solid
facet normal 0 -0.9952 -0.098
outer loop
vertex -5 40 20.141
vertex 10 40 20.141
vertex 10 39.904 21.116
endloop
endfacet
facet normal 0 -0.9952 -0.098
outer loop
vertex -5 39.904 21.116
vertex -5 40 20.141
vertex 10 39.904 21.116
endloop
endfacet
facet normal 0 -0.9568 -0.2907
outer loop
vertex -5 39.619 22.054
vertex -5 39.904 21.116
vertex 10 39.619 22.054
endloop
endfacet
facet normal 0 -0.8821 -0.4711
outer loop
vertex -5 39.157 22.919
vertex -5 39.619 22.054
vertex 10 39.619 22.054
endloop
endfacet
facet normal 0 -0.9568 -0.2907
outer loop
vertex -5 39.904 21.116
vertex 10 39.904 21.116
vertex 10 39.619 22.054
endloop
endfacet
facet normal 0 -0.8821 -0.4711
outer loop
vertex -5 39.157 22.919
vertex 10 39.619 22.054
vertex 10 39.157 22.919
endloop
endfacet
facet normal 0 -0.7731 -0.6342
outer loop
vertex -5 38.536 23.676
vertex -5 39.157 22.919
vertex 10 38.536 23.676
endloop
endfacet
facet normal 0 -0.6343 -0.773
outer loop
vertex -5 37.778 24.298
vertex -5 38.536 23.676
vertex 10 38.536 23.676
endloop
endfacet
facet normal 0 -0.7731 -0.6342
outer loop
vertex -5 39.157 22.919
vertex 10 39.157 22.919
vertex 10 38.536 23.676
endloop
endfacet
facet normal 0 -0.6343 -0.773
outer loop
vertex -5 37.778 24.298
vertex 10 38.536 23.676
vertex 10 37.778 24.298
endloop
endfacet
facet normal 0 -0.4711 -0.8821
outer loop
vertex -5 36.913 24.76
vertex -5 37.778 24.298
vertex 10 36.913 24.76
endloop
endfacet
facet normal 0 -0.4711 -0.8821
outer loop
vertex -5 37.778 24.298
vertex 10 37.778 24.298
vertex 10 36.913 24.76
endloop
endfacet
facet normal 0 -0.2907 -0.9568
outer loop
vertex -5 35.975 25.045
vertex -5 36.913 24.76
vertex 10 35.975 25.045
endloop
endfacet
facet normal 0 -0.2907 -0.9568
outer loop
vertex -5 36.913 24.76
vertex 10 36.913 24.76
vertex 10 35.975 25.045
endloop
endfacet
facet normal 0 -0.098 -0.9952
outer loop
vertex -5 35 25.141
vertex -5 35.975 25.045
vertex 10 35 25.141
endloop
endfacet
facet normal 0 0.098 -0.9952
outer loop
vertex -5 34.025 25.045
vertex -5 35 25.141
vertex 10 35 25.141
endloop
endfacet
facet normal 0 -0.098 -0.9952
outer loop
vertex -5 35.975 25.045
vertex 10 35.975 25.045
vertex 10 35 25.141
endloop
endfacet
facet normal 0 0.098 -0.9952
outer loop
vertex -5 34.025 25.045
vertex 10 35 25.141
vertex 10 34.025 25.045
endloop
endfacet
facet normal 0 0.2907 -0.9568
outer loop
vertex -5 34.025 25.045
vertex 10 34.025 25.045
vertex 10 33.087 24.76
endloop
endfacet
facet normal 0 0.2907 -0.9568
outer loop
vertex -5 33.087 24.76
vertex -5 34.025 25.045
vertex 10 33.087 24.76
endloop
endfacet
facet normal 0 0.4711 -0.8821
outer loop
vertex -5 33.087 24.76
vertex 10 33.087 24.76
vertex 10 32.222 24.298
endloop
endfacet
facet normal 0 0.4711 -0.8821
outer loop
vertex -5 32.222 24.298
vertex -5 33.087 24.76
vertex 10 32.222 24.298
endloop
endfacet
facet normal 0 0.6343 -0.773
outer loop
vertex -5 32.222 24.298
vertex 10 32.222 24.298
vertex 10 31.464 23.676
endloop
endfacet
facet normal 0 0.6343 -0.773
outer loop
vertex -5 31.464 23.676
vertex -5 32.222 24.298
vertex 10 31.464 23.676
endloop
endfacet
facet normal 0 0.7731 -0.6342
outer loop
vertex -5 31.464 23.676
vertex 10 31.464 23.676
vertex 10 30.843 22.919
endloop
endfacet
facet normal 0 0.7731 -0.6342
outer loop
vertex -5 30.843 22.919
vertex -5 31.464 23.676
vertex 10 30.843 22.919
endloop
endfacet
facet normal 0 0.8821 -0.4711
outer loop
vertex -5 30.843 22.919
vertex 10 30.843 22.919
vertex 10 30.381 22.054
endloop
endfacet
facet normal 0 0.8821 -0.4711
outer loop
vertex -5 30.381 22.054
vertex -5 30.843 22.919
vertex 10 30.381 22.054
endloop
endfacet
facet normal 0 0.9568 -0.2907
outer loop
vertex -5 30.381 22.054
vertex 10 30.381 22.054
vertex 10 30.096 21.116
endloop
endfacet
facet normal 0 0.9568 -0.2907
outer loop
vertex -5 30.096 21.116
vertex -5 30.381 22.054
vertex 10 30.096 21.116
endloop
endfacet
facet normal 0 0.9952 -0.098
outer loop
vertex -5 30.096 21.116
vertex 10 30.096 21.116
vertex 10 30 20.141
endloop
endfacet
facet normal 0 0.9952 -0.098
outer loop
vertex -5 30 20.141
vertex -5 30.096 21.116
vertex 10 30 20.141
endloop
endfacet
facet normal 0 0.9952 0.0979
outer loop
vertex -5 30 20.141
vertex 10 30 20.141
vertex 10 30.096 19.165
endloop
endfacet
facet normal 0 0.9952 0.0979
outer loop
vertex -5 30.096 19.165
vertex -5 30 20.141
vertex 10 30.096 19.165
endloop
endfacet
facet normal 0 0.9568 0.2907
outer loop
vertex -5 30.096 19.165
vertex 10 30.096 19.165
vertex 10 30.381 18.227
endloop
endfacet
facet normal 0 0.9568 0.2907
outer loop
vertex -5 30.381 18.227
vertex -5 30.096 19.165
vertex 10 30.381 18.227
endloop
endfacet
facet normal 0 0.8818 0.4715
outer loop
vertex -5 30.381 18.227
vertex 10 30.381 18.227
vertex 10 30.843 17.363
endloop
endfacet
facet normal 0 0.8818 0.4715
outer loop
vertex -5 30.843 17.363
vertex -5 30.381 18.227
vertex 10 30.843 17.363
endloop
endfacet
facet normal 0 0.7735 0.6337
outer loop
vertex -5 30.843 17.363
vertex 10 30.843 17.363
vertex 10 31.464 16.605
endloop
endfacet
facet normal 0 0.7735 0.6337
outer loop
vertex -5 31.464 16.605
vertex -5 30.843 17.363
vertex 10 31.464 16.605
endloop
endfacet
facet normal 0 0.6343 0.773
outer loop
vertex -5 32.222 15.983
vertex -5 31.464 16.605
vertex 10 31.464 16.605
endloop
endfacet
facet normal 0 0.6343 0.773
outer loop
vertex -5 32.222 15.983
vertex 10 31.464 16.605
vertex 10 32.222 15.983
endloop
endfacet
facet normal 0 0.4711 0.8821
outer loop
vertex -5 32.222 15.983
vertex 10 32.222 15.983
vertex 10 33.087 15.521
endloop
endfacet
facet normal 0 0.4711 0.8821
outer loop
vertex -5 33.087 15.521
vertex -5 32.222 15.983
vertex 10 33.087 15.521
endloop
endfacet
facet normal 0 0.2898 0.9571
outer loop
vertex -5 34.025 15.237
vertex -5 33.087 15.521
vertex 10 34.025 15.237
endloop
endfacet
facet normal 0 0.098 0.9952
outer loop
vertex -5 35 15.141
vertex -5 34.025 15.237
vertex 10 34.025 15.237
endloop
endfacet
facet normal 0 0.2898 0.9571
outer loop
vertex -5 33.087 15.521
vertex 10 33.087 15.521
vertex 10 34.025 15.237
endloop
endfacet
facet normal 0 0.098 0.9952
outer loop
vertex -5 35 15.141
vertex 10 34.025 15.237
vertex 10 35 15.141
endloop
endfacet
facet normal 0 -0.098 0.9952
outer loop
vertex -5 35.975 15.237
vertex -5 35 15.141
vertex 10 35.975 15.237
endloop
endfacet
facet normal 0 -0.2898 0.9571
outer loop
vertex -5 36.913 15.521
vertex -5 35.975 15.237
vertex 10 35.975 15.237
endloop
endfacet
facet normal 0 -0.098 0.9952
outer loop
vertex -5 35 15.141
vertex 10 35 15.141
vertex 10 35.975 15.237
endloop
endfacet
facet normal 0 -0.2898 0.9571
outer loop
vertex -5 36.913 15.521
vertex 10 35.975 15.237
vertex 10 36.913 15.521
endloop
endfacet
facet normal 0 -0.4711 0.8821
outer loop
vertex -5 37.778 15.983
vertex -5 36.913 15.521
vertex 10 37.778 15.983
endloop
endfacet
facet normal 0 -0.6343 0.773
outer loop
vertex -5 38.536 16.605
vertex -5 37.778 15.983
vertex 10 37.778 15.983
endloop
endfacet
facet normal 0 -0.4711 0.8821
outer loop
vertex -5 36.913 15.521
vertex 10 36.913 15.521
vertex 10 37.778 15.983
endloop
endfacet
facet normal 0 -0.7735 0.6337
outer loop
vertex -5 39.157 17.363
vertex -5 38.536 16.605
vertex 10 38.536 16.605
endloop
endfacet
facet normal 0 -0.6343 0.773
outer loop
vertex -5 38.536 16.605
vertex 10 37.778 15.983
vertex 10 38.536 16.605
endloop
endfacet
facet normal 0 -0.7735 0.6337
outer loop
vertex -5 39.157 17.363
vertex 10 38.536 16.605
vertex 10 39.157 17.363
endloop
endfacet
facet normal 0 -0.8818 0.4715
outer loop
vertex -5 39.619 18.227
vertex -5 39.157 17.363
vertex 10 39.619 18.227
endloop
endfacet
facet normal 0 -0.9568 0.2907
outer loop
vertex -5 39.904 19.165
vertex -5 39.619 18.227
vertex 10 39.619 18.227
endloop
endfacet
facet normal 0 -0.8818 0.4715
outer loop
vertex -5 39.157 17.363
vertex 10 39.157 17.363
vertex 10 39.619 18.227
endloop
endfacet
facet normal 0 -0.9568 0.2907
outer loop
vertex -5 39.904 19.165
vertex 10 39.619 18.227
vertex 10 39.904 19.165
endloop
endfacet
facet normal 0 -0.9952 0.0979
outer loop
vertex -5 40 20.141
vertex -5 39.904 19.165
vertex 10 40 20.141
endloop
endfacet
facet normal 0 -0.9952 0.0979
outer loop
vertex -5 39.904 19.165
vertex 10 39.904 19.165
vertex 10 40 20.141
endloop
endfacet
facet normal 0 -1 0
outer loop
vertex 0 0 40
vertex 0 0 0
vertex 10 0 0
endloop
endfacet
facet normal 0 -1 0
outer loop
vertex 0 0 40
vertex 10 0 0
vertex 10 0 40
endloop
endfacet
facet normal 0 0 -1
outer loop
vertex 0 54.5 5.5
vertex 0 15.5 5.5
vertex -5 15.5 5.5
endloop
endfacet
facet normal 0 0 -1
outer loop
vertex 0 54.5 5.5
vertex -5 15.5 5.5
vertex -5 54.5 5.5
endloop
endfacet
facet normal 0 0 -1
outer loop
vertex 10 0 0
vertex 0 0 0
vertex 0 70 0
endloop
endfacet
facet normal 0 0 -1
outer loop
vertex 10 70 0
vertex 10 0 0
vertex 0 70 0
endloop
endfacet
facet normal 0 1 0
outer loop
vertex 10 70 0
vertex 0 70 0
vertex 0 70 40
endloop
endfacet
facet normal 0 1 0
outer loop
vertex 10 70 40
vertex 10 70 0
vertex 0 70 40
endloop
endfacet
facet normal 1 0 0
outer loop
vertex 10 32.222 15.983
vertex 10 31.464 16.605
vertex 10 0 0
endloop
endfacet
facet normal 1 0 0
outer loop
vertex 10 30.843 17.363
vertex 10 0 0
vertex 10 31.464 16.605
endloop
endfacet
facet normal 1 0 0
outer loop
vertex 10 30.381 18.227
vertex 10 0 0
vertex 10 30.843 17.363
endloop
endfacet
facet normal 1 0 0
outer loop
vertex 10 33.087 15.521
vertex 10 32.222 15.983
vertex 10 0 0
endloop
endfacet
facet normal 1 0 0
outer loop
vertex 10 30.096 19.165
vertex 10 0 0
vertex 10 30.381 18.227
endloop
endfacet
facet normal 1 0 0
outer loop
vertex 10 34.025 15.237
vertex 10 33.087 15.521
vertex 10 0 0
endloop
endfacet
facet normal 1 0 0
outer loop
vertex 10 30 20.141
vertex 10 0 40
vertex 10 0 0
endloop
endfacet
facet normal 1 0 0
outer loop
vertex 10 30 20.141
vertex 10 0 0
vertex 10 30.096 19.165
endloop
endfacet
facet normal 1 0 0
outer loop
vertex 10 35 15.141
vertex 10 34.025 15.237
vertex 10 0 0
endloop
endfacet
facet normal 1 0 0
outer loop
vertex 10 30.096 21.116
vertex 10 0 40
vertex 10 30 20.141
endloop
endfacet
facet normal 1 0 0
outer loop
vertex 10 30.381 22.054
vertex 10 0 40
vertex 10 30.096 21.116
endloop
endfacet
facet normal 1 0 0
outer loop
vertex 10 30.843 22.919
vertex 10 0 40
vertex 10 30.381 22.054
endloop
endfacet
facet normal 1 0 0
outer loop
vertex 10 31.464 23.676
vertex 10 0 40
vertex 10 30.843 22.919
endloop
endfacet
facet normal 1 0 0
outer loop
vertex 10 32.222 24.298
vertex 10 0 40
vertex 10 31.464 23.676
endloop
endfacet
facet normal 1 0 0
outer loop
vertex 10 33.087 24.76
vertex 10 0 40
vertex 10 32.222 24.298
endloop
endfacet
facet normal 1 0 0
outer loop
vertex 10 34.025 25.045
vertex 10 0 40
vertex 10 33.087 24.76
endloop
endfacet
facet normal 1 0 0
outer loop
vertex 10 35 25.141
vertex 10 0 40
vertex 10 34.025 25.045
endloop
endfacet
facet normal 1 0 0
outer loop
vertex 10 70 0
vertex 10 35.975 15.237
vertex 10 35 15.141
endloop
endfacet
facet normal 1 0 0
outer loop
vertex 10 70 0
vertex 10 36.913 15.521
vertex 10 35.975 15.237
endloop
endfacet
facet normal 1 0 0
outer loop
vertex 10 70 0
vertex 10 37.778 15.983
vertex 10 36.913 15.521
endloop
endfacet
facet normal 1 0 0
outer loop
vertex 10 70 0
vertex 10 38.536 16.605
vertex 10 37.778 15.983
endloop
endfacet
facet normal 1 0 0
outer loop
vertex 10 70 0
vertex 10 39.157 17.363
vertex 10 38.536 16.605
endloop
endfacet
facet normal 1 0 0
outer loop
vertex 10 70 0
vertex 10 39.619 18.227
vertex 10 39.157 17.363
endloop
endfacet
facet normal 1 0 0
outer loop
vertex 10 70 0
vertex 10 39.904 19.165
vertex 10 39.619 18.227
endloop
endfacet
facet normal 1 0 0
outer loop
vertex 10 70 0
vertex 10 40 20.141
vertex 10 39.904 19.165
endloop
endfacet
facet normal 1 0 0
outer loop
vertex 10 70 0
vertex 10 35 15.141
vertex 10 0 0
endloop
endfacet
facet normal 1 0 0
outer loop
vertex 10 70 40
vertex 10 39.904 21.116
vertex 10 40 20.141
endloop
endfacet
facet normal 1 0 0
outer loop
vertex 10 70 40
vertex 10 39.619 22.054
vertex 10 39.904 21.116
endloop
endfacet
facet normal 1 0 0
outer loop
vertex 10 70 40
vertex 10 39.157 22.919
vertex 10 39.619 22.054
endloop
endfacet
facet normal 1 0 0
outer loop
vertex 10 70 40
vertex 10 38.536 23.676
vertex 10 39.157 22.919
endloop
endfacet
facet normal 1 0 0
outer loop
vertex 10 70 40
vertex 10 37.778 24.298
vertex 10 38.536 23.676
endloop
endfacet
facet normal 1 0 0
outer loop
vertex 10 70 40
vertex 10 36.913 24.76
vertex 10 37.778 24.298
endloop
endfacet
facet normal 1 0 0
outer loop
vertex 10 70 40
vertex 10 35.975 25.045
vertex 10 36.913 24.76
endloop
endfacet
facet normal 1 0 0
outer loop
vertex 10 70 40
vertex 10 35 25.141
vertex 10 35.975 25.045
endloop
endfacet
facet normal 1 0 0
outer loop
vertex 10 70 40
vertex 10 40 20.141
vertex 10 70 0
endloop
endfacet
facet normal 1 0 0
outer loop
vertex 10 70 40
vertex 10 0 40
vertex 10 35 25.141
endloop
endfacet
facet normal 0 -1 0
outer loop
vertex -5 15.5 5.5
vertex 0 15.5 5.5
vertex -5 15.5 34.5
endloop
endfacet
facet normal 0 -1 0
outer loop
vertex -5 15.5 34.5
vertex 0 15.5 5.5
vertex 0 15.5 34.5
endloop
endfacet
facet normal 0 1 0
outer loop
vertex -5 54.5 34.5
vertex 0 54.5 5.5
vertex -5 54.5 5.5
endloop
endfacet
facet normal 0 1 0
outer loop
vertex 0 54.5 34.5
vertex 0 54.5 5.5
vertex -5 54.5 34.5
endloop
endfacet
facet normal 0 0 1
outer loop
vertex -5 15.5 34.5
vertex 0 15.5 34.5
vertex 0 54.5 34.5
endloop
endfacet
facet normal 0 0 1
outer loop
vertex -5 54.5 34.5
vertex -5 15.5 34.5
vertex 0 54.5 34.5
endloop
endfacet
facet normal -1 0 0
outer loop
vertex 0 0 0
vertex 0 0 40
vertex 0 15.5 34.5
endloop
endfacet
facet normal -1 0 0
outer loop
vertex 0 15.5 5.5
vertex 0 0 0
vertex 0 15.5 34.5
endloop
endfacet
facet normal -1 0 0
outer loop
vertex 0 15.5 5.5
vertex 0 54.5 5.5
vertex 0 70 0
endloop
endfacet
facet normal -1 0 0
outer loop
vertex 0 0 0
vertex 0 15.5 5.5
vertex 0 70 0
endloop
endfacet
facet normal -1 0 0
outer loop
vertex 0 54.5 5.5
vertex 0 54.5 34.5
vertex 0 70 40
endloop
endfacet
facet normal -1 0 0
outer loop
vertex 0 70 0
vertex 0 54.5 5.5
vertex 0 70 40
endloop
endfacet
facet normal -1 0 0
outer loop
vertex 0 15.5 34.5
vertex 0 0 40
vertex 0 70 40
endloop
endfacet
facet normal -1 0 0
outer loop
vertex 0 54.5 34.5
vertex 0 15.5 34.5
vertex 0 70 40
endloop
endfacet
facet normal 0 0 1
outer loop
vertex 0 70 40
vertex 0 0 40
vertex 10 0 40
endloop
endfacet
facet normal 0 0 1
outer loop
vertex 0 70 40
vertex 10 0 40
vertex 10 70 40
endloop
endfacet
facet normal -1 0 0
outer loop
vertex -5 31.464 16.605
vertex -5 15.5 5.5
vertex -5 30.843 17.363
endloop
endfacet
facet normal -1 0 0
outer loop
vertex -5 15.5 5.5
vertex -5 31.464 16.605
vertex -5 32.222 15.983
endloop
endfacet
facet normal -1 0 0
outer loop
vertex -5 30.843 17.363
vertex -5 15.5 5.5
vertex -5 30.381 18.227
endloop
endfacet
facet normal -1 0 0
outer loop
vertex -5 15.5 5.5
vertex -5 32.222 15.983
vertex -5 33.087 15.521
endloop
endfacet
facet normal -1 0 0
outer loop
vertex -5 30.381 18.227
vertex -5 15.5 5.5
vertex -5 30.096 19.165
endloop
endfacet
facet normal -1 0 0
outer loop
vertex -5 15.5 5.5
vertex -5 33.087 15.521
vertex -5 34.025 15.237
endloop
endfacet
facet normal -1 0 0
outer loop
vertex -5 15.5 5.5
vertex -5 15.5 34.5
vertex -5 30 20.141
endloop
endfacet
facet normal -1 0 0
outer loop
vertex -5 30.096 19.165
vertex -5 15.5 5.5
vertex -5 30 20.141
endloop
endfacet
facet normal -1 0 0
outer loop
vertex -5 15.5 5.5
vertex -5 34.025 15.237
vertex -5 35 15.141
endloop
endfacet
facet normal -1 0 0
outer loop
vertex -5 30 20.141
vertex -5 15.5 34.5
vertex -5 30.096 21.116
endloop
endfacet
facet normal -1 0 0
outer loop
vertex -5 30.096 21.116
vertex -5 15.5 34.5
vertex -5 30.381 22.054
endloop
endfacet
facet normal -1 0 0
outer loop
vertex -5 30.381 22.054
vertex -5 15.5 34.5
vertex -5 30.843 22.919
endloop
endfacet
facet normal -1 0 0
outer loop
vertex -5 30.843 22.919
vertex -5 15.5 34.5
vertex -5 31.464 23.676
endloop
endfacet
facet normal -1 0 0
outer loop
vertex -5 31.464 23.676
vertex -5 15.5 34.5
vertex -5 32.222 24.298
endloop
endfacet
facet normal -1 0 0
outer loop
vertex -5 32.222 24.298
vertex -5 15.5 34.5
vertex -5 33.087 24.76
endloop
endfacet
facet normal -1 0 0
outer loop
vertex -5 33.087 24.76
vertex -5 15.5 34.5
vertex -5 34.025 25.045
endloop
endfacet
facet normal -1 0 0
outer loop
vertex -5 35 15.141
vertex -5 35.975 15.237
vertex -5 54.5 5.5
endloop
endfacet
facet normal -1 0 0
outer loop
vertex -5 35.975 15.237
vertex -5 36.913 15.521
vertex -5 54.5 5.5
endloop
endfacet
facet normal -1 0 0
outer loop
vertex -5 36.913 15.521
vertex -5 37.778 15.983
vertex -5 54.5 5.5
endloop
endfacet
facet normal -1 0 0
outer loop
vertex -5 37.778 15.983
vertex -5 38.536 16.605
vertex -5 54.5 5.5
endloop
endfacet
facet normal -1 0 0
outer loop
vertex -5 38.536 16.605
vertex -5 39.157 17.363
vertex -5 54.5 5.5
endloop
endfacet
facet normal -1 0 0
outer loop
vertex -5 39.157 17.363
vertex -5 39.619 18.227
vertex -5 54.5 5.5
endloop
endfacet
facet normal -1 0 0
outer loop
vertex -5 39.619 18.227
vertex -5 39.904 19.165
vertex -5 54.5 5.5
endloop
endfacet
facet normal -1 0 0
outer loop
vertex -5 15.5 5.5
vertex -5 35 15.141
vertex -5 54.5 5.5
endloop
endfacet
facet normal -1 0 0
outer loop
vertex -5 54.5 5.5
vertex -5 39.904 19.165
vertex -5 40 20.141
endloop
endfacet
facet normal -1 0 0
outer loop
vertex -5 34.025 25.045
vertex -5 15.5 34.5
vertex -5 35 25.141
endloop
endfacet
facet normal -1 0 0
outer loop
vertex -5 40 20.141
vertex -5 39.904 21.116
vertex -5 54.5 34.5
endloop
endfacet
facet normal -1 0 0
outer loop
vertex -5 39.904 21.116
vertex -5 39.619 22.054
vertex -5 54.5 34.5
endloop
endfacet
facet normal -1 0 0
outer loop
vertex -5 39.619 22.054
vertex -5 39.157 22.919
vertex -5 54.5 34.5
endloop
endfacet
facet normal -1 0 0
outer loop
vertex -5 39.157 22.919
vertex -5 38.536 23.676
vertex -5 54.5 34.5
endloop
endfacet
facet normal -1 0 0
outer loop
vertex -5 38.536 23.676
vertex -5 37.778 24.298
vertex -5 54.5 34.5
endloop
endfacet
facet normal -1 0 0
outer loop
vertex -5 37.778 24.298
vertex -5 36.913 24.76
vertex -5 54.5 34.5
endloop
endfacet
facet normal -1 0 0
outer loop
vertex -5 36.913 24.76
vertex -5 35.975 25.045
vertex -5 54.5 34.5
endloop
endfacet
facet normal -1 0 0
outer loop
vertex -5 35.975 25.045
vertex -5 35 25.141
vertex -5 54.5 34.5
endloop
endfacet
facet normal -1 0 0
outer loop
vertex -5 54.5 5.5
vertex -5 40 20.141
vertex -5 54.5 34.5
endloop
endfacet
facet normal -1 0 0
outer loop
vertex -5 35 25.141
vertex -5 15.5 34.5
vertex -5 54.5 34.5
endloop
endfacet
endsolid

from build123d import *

# Parameters (mm, degrees)
F0_W     = 70
F0_H     = 40
F1_DEPTH = 10
F2_W     = 39
F2_H     = 29
F3_DEPTH = 15
F4_R     = 5
F5_DEPTH = 25


with BuildPart() as f1:
    # F0 (on Right) → F1 (new body)
    with BuildSketch(Plane.YZ):
        with Locations((35, 20)):
            Rectangle(F0_W, F0_H)
    extrude(amount=F1_DEPTH)

    # F2 (on face) → F3 (join)
    with BuildSketch(Plane.YZ.offset(10)):
        with Locations((35, 20)):
            Rectangle(F2_W, F2_H)
    extrude(amount=-F3_DEPTH)

    # F4 (on face) → F5 (cut)
    with BuildSketch(Plane.YZ.offset(10)):
        with Locations((35, 20.140665)):
            Circle(F4_R)
    extrude(amount=-F5_DEPTH, mode=Mode.SUBTRACT)


solid = f1.part
